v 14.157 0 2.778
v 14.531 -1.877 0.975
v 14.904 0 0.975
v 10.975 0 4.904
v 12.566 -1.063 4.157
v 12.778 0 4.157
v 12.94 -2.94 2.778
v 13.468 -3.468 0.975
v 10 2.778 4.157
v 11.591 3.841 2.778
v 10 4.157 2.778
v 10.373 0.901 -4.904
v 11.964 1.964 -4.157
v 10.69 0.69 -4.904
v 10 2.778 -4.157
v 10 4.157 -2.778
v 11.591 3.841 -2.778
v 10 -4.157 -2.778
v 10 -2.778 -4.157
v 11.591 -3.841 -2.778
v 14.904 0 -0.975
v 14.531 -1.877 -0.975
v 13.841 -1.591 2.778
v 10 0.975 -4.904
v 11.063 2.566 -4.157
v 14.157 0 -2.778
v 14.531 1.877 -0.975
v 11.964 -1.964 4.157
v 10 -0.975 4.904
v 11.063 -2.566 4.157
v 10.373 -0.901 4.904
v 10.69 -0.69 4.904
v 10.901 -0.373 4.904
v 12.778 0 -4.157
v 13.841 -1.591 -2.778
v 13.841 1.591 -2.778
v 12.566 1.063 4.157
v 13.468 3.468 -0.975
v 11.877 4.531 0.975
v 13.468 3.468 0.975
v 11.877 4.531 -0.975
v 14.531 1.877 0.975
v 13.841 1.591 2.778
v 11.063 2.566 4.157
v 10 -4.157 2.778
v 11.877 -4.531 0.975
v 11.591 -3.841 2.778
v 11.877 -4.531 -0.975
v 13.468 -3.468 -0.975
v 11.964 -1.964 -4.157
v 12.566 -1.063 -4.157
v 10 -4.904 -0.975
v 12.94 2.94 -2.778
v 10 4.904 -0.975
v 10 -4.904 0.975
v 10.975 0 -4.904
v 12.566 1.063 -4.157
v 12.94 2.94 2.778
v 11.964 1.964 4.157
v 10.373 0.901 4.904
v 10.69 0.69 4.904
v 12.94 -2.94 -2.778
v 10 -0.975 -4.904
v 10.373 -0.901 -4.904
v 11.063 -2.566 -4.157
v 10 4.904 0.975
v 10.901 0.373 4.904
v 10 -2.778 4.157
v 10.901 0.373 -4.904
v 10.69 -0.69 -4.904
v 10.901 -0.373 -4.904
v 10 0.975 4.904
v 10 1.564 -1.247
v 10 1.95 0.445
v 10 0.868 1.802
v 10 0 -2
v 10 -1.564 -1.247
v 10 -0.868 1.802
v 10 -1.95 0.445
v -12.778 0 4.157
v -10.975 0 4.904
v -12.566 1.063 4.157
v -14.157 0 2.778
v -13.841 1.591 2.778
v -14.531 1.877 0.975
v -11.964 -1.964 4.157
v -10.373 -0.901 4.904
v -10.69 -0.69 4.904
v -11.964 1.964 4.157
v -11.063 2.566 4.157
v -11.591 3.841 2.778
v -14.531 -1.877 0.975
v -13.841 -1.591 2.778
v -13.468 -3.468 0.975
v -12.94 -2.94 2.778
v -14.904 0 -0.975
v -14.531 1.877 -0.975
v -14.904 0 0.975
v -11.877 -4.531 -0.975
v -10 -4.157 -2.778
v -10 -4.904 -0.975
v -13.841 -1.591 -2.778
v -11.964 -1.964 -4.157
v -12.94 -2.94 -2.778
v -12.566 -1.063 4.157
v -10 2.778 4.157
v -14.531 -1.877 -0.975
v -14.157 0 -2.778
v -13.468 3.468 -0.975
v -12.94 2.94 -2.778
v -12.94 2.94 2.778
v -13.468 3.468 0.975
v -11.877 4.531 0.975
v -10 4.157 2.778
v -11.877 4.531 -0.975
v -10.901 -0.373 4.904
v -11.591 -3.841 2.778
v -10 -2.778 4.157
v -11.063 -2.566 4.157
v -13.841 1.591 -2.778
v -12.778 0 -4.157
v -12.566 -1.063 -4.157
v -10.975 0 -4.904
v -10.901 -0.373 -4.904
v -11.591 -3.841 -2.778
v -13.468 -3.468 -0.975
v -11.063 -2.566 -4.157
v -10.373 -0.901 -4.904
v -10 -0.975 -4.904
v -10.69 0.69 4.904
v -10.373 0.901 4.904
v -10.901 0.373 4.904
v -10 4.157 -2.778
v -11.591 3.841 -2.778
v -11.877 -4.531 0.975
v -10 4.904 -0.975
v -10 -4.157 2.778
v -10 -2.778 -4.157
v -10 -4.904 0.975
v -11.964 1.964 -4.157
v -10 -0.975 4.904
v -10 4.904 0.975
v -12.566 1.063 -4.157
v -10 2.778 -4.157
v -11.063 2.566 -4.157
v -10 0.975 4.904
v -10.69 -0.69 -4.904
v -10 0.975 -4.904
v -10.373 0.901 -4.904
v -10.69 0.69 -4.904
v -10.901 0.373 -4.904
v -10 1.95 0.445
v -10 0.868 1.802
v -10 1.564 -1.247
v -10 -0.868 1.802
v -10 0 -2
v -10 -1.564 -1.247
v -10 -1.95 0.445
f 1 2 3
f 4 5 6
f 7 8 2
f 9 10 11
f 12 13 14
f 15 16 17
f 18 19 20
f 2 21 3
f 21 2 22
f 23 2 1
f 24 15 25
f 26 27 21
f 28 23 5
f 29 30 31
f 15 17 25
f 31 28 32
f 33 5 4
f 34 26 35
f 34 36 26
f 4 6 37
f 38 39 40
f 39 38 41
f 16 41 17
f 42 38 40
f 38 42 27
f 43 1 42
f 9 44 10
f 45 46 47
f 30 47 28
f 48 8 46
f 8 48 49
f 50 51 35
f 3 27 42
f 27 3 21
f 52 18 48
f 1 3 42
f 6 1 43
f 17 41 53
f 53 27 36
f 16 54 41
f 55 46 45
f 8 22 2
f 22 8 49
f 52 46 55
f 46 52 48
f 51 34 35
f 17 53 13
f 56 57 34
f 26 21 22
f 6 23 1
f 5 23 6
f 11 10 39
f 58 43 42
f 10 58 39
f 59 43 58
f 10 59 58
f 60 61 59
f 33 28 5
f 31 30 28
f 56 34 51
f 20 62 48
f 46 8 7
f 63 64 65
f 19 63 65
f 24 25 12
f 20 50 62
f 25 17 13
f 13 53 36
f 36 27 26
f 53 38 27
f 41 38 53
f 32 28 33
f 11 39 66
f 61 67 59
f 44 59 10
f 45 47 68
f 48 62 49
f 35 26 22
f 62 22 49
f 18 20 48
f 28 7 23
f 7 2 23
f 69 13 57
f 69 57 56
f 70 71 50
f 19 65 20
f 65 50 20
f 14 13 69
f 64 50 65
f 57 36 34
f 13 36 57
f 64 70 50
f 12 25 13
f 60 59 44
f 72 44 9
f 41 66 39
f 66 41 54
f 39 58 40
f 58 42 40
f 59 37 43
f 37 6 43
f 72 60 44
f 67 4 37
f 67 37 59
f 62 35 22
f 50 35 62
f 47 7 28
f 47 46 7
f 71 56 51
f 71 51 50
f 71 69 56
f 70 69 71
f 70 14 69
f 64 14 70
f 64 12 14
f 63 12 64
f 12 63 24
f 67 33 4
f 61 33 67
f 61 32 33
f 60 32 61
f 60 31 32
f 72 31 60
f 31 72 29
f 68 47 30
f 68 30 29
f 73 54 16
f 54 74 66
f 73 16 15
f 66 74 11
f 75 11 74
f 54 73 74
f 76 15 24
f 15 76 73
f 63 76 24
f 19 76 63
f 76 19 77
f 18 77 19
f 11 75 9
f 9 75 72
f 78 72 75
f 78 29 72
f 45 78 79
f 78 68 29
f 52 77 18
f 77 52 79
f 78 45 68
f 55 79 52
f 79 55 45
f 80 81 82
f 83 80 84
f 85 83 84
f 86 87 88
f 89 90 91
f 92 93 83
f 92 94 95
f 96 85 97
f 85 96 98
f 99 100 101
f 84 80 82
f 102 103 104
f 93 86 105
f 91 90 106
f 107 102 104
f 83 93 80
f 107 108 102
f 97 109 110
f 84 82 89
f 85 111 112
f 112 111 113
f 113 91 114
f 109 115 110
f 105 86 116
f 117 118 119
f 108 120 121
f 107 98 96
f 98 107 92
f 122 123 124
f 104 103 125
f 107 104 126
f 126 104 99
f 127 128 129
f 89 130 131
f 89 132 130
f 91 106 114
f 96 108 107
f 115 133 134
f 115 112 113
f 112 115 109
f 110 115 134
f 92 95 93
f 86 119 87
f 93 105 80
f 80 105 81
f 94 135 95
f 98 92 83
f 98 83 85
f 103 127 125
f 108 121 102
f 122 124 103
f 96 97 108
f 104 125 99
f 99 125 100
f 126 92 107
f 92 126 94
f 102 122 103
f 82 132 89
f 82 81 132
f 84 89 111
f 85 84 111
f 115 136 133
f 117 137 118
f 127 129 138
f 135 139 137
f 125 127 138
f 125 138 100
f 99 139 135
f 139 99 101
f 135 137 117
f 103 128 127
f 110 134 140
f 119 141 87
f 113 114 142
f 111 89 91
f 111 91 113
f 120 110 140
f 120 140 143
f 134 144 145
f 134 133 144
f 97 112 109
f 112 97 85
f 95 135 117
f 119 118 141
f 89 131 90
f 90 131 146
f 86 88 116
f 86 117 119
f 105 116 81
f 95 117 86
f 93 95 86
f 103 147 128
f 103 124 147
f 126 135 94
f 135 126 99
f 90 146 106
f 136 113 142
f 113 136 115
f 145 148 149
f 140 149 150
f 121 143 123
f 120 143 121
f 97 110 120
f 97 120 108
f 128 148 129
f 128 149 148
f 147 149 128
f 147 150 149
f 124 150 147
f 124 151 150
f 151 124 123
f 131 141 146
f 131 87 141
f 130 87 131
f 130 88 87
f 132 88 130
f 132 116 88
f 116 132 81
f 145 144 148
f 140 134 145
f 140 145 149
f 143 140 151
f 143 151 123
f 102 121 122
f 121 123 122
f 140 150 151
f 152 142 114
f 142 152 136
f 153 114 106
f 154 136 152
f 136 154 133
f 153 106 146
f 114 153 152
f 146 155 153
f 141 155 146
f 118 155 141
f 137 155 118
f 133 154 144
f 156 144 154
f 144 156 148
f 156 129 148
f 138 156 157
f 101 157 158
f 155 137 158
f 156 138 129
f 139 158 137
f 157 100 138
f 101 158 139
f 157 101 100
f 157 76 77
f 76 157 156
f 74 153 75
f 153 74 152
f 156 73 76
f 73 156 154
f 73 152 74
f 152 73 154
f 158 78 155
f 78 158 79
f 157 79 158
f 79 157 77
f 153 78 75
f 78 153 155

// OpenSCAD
mirror([1,0,0])
union() {
    translate([-10,0,0])
        difference() {
            color("red") sphere(r=5);
                translate([0,-5,-5]) cube(10);
        } 
    rotate([0,90,0]) cylinder(r=2,h=20,center=true);
    translate([10,0,0])
        difference() {
            color("green") sphere(r=5);
                translate([-10,-5,-5]) cube(10);
        }
}
